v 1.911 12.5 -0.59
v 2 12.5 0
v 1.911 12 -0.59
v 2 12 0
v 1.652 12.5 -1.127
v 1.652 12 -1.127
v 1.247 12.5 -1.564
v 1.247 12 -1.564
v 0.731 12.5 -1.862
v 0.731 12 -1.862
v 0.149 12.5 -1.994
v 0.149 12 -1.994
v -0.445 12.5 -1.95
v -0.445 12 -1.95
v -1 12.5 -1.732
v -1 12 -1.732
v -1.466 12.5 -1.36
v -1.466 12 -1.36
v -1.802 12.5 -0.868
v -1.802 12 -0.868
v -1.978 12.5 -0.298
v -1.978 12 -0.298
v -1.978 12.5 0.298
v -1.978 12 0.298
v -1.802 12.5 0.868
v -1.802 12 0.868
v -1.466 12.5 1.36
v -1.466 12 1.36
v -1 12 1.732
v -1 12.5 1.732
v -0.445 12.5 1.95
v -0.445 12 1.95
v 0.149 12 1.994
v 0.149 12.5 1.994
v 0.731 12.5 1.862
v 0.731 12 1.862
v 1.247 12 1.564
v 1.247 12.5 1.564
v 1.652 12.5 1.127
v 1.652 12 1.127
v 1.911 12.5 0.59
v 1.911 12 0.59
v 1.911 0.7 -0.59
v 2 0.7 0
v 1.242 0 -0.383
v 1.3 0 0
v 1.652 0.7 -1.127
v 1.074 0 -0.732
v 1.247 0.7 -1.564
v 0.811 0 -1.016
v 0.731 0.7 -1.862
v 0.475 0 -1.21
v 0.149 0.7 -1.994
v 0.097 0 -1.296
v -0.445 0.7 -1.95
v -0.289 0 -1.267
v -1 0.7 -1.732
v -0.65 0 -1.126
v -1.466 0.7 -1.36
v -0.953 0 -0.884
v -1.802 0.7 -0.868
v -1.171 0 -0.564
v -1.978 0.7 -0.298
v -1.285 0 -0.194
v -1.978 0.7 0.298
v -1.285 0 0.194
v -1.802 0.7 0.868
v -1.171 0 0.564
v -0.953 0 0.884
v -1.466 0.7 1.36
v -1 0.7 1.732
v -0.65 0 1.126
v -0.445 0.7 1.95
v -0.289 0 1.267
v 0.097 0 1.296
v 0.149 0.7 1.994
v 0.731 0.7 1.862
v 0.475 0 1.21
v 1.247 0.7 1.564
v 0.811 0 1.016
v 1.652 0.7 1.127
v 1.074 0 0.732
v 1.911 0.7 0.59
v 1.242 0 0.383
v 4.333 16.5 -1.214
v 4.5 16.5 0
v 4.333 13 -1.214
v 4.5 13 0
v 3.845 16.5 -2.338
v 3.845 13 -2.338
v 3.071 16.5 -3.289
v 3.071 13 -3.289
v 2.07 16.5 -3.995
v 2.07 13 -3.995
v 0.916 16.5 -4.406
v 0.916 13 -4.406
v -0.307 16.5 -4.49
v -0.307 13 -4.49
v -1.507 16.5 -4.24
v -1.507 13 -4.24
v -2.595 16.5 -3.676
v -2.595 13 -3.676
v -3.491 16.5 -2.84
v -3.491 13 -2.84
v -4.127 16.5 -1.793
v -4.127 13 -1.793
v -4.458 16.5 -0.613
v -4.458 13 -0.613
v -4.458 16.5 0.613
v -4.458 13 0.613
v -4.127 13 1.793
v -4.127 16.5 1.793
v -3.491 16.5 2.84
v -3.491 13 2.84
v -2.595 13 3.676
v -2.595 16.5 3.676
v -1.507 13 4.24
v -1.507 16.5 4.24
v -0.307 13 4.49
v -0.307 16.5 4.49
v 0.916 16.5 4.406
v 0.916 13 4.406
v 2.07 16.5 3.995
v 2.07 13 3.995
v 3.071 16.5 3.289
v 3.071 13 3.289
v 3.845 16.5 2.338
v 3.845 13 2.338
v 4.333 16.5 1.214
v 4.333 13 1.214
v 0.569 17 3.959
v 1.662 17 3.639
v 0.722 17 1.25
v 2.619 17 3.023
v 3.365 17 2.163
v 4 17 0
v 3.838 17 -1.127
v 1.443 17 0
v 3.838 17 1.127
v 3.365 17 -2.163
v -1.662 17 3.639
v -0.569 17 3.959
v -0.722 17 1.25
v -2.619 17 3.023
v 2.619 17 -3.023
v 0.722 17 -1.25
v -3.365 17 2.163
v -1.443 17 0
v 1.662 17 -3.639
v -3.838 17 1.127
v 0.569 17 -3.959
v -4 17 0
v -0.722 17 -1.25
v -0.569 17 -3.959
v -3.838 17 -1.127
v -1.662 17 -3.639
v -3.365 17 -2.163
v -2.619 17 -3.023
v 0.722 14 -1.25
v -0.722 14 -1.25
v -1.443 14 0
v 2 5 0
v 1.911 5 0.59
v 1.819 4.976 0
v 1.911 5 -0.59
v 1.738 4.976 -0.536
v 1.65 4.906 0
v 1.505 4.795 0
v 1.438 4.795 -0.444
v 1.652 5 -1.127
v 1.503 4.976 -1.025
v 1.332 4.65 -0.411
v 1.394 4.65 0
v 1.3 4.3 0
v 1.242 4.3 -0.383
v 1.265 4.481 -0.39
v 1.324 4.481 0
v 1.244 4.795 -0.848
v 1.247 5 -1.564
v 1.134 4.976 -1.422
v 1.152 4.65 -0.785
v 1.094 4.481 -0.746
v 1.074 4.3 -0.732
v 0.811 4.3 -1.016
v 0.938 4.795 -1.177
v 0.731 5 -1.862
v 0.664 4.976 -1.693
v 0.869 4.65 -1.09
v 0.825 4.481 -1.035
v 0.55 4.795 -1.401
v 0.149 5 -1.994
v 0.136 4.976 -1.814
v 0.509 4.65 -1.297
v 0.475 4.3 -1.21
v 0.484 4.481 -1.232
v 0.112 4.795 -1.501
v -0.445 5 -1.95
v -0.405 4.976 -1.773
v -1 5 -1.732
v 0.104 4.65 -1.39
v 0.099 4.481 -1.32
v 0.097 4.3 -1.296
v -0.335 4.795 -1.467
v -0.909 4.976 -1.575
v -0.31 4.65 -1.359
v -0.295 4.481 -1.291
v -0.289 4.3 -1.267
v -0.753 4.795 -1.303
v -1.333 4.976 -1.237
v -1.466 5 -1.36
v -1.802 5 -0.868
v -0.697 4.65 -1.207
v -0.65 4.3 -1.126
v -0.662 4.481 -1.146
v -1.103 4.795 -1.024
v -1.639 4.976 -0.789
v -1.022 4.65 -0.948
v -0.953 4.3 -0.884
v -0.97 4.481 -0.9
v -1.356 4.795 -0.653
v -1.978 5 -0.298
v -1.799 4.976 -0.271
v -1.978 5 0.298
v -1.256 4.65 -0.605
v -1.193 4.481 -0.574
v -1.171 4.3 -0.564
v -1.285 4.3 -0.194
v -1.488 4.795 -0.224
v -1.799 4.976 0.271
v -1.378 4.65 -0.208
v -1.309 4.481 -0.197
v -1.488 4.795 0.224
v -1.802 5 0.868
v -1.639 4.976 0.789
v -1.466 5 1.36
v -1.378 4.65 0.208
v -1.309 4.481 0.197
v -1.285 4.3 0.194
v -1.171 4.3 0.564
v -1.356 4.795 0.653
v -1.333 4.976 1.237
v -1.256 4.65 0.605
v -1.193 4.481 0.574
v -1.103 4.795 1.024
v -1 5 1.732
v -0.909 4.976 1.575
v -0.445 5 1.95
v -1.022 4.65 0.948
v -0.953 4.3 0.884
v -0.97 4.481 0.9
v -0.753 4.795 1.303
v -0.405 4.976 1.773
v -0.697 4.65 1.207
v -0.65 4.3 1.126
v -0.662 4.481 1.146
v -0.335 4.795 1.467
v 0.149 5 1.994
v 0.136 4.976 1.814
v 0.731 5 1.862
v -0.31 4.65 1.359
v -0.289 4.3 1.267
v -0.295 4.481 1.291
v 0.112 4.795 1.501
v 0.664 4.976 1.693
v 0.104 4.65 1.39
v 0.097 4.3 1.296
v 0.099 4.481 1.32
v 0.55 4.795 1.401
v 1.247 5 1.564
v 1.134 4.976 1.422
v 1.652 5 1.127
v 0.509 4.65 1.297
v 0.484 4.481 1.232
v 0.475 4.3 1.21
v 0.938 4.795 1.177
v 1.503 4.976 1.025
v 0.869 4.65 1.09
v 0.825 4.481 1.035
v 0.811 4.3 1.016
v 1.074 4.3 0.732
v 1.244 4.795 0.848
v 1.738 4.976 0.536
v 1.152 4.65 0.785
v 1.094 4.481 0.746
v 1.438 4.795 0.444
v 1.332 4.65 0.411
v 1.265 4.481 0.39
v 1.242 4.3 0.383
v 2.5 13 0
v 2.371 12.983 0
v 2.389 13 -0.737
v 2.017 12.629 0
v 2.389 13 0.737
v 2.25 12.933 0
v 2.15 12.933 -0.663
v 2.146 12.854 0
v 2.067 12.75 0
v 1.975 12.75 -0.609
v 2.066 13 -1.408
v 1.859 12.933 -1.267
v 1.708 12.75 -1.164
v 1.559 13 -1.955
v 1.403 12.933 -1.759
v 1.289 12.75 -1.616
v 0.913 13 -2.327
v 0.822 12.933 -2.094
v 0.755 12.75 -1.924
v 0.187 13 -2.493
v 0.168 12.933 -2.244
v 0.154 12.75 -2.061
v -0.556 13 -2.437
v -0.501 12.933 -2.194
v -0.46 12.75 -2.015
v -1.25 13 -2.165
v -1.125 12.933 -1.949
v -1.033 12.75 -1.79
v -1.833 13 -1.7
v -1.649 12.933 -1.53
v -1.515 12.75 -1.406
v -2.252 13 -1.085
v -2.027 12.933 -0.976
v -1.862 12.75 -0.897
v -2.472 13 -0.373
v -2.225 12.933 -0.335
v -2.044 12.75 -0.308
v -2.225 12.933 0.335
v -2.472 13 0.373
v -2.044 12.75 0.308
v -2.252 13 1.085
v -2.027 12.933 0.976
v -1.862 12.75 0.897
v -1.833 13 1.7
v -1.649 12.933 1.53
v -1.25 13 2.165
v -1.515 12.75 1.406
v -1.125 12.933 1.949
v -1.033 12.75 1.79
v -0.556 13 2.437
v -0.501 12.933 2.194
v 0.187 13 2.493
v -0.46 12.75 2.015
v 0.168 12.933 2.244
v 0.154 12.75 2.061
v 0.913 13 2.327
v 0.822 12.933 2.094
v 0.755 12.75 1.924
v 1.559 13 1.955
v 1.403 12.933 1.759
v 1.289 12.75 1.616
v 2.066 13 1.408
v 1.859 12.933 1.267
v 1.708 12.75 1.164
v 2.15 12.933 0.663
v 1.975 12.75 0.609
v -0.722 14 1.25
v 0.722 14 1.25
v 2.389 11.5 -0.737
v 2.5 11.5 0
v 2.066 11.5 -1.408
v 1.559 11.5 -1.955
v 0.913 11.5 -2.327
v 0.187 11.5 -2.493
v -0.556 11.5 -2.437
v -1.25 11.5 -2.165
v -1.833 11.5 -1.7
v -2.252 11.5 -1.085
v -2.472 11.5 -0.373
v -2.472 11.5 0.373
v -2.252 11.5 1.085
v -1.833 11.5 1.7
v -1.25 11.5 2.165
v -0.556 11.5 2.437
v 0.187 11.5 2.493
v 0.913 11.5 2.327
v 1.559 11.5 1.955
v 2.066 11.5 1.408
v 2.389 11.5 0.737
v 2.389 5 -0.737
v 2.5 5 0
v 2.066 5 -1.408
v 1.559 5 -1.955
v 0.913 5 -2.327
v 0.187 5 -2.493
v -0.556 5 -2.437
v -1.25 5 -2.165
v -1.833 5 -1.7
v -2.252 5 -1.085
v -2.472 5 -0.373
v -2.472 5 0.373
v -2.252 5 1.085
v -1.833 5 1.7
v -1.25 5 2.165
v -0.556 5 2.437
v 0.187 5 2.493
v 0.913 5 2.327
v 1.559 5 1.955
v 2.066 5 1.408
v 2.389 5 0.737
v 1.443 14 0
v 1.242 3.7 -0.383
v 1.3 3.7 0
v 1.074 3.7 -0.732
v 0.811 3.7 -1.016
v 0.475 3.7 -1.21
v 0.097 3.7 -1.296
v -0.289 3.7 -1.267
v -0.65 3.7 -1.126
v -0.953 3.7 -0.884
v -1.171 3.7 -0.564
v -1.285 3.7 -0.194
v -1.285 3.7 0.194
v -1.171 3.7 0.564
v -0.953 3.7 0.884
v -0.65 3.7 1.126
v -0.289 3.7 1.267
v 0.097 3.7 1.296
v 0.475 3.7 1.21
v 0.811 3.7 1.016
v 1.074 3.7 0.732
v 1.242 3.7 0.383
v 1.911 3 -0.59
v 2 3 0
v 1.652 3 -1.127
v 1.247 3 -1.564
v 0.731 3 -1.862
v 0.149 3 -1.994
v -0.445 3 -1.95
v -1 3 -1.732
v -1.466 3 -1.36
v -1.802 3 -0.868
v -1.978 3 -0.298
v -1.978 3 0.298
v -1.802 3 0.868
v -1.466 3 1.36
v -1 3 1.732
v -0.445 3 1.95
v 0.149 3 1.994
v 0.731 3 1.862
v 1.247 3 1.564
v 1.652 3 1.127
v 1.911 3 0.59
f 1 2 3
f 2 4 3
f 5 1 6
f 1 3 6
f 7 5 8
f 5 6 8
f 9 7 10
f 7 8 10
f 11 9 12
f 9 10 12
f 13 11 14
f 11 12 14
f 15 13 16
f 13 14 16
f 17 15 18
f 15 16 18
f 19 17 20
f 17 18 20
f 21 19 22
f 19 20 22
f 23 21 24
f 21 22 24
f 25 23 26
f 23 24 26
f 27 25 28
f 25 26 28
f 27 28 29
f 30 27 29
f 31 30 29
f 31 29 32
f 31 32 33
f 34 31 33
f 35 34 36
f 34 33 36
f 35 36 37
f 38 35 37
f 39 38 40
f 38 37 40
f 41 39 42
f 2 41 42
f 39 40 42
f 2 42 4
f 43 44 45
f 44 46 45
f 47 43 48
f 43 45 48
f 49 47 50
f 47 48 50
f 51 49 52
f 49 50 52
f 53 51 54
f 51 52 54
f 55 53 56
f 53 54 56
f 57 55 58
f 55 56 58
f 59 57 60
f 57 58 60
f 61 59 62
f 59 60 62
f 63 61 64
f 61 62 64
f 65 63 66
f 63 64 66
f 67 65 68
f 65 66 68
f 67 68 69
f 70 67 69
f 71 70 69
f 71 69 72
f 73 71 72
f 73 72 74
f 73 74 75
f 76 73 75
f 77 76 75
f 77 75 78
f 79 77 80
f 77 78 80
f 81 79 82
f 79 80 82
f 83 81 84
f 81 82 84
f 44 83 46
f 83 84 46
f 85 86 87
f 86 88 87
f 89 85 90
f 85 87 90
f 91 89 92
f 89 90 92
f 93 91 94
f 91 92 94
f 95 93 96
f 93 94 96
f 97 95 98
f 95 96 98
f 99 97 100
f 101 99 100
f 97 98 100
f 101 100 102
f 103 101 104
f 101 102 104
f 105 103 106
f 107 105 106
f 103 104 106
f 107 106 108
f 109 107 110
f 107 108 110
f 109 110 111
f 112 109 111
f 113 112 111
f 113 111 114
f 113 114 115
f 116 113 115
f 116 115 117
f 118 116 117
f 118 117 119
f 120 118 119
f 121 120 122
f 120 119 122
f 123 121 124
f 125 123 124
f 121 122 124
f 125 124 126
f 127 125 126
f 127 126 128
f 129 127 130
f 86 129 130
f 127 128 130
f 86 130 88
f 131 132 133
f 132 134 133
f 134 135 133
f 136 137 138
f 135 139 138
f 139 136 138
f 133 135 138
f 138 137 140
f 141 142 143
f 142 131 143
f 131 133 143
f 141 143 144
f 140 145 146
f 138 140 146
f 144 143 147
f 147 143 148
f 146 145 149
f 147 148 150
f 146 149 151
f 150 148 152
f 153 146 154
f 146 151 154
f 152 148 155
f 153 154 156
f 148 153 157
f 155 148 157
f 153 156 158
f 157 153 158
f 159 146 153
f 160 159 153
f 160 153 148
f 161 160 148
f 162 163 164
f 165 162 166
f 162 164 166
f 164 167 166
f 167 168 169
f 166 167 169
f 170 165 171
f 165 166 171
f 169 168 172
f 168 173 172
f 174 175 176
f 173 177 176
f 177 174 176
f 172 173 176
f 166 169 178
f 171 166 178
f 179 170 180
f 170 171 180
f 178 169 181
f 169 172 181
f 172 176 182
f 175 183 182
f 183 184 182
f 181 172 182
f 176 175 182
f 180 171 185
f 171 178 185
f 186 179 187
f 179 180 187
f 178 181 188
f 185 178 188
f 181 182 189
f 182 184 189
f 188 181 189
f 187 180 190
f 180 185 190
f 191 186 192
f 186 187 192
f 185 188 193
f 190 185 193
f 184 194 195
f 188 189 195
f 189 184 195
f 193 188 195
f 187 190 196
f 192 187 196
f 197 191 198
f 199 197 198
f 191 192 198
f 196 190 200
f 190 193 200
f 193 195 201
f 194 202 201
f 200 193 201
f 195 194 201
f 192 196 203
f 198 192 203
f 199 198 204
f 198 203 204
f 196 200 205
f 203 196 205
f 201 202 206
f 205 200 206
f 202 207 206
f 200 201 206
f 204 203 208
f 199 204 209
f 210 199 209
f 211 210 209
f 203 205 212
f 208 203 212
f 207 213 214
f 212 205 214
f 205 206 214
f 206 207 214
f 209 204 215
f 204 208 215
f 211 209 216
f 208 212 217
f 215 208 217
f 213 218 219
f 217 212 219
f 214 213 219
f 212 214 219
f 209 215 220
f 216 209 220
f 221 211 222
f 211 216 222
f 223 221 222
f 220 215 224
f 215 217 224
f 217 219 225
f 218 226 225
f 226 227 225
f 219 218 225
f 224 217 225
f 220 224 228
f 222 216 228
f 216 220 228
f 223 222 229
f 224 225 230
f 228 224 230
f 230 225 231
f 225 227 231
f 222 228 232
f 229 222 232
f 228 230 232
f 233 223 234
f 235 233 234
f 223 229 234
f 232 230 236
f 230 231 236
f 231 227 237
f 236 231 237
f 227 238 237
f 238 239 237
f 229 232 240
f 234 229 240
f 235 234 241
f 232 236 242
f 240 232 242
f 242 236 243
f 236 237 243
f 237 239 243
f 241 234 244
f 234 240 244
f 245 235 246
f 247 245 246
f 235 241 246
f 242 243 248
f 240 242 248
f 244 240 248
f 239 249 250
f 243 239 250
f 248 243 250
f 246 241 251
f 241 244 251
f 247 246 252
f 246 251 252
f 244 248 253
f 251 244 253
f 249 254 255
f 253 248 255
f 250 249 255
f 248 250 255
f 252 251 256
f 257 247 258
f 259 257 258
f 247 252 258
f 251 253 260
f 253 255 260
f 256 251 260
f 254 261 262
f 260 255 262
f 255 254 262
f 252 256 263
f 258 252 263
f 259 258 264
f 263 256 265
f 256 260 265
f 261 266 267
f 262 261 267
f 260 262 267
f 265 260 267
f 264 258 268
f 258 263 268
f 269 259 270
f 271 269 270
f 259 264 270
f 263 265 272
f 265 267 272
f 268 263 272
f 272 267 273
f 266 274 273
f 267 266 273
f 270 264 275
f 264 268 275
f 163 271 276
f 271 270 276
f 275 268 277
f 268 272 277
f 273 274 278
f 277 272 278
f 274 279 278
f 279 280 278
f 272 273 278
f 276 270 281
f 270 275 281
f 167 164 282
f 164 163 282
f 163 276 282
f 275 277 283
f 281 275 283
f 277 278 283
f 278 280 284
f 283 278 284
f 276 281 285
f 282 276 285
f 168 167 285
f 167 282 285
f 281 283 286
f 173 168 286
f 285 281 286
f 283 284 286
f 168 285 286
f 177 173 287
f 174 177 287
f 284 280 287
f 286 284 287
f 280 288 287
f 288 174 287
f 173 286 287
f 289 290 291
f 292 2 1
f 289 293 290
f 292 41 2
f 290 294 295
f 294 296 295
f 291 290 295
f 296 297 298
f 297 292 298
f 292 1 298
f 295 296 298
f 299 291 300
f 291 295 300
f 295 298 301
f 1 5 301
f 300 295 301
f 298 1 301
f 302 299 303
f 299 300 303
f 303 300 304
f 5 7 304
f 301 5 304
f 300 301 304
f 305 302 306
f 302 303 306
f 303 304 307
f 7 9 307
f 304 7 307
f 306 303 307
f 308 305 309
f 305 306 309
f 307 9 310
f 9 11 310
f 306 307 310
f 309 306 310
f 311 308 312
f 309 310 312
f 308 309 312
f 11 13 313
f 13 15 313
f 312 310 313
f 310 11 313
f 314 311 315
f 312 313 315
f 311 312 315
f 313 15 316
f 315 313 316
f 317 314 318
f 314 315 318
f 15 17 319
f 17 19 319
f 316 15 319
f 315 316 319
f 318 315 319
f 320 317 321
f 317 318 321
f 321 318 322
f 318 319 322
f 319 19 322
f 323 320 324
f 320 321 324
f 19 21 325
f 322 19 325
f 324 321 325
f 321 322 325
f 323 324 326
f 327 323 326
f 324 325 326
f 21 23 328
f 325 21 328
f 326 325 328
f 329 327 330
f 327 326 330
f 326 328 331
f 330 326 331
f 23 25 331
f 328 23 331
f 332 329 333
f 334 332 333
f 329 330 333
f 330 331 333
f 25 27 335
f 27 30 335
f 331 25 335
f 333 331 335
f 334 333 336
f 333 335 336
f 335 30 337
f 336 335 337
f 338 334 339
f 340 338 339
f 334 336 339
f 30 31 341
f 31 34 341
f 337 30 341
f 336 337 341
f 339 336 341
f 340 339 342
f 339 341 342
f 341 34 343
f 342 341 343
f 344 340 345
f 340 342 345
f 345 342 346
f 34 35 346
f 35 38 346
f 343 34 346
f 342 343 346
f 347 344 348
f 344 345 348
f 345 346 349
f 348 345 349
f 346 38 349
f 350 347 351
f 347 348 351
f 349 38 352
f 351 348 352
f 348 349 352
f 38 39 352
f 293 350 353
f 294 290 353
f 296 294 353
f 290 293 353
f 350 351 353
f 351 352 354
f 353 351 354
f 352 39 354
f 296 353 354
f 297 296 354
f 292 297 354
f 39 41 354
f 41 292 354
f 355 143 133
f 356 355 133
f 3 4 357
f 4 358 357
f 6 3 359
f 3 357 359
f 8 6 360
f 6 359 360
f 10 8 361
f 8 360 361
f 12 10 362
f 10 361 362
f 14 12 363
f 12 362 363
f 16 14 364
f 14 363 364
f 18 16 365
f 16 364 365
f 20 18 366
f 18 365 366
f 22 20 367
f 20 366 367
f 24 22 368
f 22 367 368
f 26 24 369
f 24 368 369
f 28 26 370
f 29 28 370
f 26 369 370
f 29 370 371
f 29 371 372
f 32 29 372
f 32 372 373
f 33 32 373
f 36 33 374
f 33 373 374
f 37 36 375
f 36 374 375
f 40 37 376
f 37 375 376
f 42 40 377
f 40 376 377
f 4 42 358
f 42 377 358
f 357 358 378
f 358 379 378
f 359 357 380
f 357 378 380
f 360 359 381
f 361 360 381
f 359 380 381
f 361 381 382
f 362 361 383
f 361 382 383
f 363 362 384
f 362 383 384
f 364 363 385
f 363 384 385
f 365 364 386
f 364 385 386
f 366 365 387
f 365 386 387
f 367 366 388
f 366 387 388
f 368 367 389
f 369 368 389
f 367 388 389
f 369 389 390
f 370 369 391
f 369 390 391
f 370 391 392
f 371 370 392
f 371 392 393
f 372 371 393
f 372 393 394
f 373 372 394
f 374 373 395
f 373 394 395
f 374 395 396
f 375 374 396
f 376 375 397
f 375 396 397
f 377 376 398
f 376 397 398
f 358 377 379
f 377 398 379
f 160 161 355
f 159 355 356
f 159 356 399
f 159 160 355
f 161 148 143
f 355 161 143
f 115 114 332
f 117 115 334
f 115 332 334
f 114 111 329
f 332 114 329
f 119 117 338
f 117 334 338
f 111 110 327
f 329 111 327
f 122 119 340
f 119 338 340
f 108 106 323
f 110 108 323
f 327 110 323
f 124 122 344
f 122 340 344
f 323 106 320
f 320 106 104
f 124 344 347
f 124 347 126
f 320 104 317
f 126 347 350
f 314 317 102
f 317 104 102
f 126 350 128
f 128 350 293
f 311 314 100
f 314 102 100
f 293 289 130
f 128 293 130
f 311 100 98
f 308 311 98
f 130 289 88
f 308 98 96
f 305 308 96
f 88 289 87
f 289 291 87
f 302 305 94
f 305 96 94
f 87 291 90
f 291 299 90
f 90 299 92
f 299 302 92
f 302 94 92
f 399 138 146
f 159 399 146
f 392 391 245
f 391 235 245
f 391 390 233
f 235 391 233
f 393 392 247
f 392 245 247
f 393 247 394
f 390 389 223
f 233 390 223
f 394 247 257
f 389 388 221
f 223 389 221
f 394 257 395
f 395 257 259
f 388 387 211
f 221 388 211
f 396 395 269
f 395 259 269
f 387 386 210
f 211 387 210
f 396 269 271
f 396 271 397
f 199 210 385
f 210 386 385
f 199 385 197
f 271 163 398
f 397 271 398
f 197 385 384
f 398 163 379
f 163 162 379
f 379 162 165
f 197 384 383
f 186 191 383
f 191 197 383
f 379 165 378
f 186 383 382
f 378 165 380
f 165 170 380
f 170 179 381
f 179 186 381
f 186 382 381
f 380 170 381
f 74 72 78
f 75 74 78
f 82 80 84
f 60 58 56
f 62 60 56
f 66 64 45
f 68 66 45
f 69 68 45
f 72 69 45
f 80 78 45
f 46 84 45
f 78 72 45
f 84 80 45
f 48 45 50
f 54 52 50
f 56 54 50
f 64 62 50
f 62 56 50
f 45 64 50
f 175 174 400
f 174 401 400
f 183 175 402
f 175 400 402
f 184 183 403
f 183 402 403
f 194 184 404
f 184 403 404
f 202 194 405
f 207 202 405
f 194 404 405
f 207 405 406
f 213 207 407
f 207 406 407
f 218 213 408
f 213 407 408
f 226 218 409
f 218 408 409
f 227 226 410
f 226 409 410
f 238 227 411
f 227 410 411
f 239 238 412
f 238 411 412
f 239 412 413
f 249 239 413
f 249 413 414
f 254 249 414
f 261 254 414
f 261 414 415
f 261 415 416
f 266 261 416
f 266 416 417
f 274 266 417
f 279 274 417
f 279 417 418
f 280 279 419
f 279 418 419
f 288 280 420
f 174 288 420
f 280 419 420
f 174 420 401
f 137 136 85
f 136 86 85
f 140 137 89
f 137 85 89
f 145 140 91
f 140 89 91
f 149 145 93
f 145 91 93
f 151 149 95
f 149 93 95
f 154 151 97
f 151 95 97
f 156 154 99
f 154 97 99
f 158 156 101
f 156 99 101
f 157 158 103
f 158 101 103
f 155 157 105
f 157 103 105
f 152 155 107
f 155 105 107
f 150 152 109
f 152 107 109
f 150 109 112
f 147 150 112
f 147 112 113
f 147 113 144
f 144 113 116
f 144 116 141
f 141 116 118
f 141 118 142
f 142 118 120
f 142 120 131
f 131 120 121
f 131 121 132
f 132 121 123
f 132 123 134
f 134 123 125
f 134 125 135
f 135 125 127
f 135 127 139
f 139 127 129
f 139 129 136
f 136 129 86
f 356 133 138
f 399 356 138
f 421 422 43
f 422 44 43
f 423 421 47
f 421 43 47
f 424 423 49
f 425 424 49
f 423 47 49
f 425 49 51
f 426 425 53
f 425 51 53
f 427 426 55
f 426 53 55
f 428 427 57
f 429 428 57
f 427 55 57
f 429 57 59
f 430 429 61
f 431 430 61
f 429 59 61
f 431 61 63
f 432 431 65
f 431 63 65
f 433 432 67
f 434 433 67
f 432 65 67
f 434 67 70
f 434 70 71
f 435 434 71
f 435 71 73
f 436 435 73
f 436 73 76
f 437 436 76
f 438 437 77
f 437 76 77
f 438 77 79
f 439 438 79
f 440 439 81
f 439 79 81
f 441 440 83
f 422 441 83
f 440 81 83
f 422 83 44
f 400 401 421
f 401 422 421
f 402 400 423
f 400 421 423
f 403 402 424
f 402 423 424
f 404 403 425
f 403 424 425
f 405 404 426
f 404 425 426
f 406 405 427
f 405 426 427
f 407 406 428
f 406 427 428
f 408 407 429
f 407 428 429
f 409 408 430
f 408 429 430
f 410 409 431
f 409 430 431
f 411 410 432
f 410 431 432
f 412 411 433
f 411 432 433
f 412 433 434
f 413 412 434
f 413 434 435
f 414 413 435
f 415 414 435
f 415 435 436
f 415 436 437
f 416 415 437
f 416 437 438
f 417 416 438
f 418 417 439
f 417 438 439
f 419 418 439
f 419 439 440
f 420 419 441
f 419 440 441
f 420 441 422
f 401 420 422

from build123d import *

# Parameters (mm, degrees)
CUT_EXTRUDE1_DEPTH = 3


with BuildPart() as part:
    # Sketch1 → Revolve1 (revolve)
    with BuildSketch(Plane.XY):
        with BuildLine():
            Line((0, 0), (0, 17))
            Line((0, 17), (4, 17))
            Line((4, 17), (4.5, 16.5))
            Line((4.5, 16.5), (4.5, 13))
            Line((4.5, 13), (2.5, 13))
            ThreePointArc((2.5, 13), (2.146446609, 12.853553391), (2, 12.5))
            Line((2, 12.5), (2, 12))
            Line((2, 12), (2.5, 11.5))
            Line((2.5, 11.5), (2.5, 5))
            Line((2.5, 5), (2, 5))
            ThreePointArc((2, 5), (1.505025253, 4.794974747), (1.3, 4.3))
            Line((1.3, 4.3), (1.3, 3.7))
            Line((1.3, 3.7), (2, 3))
            Line((2, 3), (2, 0.7))
            Line((2, 0.7), (1.3, 0))
            Line((1.3, 0), (0, 0))
        make_face()
    revolve(axis=Axis((0, 0, 0), (0, 1, 0)))

    # Sketch2 → Cut-Extrude1 (cut)
    with BuildSketch(Plane(origin=(0, 17, 0), x_dir=(1, 0, 0), z_dir=(0, 1, 0))):
        Polygon((0.721687836, 1.25), (-0.721687836, 1.25), (-1.443375673, 0), (-0.721687836, -1.25), (0.721687836, -1.25), (1.443375673, 0), align=None)
    extrude(amount=-CUT_EXTRUDE1_DEPTH, mode=Mode.SUBTRACT)


solid = part.part
